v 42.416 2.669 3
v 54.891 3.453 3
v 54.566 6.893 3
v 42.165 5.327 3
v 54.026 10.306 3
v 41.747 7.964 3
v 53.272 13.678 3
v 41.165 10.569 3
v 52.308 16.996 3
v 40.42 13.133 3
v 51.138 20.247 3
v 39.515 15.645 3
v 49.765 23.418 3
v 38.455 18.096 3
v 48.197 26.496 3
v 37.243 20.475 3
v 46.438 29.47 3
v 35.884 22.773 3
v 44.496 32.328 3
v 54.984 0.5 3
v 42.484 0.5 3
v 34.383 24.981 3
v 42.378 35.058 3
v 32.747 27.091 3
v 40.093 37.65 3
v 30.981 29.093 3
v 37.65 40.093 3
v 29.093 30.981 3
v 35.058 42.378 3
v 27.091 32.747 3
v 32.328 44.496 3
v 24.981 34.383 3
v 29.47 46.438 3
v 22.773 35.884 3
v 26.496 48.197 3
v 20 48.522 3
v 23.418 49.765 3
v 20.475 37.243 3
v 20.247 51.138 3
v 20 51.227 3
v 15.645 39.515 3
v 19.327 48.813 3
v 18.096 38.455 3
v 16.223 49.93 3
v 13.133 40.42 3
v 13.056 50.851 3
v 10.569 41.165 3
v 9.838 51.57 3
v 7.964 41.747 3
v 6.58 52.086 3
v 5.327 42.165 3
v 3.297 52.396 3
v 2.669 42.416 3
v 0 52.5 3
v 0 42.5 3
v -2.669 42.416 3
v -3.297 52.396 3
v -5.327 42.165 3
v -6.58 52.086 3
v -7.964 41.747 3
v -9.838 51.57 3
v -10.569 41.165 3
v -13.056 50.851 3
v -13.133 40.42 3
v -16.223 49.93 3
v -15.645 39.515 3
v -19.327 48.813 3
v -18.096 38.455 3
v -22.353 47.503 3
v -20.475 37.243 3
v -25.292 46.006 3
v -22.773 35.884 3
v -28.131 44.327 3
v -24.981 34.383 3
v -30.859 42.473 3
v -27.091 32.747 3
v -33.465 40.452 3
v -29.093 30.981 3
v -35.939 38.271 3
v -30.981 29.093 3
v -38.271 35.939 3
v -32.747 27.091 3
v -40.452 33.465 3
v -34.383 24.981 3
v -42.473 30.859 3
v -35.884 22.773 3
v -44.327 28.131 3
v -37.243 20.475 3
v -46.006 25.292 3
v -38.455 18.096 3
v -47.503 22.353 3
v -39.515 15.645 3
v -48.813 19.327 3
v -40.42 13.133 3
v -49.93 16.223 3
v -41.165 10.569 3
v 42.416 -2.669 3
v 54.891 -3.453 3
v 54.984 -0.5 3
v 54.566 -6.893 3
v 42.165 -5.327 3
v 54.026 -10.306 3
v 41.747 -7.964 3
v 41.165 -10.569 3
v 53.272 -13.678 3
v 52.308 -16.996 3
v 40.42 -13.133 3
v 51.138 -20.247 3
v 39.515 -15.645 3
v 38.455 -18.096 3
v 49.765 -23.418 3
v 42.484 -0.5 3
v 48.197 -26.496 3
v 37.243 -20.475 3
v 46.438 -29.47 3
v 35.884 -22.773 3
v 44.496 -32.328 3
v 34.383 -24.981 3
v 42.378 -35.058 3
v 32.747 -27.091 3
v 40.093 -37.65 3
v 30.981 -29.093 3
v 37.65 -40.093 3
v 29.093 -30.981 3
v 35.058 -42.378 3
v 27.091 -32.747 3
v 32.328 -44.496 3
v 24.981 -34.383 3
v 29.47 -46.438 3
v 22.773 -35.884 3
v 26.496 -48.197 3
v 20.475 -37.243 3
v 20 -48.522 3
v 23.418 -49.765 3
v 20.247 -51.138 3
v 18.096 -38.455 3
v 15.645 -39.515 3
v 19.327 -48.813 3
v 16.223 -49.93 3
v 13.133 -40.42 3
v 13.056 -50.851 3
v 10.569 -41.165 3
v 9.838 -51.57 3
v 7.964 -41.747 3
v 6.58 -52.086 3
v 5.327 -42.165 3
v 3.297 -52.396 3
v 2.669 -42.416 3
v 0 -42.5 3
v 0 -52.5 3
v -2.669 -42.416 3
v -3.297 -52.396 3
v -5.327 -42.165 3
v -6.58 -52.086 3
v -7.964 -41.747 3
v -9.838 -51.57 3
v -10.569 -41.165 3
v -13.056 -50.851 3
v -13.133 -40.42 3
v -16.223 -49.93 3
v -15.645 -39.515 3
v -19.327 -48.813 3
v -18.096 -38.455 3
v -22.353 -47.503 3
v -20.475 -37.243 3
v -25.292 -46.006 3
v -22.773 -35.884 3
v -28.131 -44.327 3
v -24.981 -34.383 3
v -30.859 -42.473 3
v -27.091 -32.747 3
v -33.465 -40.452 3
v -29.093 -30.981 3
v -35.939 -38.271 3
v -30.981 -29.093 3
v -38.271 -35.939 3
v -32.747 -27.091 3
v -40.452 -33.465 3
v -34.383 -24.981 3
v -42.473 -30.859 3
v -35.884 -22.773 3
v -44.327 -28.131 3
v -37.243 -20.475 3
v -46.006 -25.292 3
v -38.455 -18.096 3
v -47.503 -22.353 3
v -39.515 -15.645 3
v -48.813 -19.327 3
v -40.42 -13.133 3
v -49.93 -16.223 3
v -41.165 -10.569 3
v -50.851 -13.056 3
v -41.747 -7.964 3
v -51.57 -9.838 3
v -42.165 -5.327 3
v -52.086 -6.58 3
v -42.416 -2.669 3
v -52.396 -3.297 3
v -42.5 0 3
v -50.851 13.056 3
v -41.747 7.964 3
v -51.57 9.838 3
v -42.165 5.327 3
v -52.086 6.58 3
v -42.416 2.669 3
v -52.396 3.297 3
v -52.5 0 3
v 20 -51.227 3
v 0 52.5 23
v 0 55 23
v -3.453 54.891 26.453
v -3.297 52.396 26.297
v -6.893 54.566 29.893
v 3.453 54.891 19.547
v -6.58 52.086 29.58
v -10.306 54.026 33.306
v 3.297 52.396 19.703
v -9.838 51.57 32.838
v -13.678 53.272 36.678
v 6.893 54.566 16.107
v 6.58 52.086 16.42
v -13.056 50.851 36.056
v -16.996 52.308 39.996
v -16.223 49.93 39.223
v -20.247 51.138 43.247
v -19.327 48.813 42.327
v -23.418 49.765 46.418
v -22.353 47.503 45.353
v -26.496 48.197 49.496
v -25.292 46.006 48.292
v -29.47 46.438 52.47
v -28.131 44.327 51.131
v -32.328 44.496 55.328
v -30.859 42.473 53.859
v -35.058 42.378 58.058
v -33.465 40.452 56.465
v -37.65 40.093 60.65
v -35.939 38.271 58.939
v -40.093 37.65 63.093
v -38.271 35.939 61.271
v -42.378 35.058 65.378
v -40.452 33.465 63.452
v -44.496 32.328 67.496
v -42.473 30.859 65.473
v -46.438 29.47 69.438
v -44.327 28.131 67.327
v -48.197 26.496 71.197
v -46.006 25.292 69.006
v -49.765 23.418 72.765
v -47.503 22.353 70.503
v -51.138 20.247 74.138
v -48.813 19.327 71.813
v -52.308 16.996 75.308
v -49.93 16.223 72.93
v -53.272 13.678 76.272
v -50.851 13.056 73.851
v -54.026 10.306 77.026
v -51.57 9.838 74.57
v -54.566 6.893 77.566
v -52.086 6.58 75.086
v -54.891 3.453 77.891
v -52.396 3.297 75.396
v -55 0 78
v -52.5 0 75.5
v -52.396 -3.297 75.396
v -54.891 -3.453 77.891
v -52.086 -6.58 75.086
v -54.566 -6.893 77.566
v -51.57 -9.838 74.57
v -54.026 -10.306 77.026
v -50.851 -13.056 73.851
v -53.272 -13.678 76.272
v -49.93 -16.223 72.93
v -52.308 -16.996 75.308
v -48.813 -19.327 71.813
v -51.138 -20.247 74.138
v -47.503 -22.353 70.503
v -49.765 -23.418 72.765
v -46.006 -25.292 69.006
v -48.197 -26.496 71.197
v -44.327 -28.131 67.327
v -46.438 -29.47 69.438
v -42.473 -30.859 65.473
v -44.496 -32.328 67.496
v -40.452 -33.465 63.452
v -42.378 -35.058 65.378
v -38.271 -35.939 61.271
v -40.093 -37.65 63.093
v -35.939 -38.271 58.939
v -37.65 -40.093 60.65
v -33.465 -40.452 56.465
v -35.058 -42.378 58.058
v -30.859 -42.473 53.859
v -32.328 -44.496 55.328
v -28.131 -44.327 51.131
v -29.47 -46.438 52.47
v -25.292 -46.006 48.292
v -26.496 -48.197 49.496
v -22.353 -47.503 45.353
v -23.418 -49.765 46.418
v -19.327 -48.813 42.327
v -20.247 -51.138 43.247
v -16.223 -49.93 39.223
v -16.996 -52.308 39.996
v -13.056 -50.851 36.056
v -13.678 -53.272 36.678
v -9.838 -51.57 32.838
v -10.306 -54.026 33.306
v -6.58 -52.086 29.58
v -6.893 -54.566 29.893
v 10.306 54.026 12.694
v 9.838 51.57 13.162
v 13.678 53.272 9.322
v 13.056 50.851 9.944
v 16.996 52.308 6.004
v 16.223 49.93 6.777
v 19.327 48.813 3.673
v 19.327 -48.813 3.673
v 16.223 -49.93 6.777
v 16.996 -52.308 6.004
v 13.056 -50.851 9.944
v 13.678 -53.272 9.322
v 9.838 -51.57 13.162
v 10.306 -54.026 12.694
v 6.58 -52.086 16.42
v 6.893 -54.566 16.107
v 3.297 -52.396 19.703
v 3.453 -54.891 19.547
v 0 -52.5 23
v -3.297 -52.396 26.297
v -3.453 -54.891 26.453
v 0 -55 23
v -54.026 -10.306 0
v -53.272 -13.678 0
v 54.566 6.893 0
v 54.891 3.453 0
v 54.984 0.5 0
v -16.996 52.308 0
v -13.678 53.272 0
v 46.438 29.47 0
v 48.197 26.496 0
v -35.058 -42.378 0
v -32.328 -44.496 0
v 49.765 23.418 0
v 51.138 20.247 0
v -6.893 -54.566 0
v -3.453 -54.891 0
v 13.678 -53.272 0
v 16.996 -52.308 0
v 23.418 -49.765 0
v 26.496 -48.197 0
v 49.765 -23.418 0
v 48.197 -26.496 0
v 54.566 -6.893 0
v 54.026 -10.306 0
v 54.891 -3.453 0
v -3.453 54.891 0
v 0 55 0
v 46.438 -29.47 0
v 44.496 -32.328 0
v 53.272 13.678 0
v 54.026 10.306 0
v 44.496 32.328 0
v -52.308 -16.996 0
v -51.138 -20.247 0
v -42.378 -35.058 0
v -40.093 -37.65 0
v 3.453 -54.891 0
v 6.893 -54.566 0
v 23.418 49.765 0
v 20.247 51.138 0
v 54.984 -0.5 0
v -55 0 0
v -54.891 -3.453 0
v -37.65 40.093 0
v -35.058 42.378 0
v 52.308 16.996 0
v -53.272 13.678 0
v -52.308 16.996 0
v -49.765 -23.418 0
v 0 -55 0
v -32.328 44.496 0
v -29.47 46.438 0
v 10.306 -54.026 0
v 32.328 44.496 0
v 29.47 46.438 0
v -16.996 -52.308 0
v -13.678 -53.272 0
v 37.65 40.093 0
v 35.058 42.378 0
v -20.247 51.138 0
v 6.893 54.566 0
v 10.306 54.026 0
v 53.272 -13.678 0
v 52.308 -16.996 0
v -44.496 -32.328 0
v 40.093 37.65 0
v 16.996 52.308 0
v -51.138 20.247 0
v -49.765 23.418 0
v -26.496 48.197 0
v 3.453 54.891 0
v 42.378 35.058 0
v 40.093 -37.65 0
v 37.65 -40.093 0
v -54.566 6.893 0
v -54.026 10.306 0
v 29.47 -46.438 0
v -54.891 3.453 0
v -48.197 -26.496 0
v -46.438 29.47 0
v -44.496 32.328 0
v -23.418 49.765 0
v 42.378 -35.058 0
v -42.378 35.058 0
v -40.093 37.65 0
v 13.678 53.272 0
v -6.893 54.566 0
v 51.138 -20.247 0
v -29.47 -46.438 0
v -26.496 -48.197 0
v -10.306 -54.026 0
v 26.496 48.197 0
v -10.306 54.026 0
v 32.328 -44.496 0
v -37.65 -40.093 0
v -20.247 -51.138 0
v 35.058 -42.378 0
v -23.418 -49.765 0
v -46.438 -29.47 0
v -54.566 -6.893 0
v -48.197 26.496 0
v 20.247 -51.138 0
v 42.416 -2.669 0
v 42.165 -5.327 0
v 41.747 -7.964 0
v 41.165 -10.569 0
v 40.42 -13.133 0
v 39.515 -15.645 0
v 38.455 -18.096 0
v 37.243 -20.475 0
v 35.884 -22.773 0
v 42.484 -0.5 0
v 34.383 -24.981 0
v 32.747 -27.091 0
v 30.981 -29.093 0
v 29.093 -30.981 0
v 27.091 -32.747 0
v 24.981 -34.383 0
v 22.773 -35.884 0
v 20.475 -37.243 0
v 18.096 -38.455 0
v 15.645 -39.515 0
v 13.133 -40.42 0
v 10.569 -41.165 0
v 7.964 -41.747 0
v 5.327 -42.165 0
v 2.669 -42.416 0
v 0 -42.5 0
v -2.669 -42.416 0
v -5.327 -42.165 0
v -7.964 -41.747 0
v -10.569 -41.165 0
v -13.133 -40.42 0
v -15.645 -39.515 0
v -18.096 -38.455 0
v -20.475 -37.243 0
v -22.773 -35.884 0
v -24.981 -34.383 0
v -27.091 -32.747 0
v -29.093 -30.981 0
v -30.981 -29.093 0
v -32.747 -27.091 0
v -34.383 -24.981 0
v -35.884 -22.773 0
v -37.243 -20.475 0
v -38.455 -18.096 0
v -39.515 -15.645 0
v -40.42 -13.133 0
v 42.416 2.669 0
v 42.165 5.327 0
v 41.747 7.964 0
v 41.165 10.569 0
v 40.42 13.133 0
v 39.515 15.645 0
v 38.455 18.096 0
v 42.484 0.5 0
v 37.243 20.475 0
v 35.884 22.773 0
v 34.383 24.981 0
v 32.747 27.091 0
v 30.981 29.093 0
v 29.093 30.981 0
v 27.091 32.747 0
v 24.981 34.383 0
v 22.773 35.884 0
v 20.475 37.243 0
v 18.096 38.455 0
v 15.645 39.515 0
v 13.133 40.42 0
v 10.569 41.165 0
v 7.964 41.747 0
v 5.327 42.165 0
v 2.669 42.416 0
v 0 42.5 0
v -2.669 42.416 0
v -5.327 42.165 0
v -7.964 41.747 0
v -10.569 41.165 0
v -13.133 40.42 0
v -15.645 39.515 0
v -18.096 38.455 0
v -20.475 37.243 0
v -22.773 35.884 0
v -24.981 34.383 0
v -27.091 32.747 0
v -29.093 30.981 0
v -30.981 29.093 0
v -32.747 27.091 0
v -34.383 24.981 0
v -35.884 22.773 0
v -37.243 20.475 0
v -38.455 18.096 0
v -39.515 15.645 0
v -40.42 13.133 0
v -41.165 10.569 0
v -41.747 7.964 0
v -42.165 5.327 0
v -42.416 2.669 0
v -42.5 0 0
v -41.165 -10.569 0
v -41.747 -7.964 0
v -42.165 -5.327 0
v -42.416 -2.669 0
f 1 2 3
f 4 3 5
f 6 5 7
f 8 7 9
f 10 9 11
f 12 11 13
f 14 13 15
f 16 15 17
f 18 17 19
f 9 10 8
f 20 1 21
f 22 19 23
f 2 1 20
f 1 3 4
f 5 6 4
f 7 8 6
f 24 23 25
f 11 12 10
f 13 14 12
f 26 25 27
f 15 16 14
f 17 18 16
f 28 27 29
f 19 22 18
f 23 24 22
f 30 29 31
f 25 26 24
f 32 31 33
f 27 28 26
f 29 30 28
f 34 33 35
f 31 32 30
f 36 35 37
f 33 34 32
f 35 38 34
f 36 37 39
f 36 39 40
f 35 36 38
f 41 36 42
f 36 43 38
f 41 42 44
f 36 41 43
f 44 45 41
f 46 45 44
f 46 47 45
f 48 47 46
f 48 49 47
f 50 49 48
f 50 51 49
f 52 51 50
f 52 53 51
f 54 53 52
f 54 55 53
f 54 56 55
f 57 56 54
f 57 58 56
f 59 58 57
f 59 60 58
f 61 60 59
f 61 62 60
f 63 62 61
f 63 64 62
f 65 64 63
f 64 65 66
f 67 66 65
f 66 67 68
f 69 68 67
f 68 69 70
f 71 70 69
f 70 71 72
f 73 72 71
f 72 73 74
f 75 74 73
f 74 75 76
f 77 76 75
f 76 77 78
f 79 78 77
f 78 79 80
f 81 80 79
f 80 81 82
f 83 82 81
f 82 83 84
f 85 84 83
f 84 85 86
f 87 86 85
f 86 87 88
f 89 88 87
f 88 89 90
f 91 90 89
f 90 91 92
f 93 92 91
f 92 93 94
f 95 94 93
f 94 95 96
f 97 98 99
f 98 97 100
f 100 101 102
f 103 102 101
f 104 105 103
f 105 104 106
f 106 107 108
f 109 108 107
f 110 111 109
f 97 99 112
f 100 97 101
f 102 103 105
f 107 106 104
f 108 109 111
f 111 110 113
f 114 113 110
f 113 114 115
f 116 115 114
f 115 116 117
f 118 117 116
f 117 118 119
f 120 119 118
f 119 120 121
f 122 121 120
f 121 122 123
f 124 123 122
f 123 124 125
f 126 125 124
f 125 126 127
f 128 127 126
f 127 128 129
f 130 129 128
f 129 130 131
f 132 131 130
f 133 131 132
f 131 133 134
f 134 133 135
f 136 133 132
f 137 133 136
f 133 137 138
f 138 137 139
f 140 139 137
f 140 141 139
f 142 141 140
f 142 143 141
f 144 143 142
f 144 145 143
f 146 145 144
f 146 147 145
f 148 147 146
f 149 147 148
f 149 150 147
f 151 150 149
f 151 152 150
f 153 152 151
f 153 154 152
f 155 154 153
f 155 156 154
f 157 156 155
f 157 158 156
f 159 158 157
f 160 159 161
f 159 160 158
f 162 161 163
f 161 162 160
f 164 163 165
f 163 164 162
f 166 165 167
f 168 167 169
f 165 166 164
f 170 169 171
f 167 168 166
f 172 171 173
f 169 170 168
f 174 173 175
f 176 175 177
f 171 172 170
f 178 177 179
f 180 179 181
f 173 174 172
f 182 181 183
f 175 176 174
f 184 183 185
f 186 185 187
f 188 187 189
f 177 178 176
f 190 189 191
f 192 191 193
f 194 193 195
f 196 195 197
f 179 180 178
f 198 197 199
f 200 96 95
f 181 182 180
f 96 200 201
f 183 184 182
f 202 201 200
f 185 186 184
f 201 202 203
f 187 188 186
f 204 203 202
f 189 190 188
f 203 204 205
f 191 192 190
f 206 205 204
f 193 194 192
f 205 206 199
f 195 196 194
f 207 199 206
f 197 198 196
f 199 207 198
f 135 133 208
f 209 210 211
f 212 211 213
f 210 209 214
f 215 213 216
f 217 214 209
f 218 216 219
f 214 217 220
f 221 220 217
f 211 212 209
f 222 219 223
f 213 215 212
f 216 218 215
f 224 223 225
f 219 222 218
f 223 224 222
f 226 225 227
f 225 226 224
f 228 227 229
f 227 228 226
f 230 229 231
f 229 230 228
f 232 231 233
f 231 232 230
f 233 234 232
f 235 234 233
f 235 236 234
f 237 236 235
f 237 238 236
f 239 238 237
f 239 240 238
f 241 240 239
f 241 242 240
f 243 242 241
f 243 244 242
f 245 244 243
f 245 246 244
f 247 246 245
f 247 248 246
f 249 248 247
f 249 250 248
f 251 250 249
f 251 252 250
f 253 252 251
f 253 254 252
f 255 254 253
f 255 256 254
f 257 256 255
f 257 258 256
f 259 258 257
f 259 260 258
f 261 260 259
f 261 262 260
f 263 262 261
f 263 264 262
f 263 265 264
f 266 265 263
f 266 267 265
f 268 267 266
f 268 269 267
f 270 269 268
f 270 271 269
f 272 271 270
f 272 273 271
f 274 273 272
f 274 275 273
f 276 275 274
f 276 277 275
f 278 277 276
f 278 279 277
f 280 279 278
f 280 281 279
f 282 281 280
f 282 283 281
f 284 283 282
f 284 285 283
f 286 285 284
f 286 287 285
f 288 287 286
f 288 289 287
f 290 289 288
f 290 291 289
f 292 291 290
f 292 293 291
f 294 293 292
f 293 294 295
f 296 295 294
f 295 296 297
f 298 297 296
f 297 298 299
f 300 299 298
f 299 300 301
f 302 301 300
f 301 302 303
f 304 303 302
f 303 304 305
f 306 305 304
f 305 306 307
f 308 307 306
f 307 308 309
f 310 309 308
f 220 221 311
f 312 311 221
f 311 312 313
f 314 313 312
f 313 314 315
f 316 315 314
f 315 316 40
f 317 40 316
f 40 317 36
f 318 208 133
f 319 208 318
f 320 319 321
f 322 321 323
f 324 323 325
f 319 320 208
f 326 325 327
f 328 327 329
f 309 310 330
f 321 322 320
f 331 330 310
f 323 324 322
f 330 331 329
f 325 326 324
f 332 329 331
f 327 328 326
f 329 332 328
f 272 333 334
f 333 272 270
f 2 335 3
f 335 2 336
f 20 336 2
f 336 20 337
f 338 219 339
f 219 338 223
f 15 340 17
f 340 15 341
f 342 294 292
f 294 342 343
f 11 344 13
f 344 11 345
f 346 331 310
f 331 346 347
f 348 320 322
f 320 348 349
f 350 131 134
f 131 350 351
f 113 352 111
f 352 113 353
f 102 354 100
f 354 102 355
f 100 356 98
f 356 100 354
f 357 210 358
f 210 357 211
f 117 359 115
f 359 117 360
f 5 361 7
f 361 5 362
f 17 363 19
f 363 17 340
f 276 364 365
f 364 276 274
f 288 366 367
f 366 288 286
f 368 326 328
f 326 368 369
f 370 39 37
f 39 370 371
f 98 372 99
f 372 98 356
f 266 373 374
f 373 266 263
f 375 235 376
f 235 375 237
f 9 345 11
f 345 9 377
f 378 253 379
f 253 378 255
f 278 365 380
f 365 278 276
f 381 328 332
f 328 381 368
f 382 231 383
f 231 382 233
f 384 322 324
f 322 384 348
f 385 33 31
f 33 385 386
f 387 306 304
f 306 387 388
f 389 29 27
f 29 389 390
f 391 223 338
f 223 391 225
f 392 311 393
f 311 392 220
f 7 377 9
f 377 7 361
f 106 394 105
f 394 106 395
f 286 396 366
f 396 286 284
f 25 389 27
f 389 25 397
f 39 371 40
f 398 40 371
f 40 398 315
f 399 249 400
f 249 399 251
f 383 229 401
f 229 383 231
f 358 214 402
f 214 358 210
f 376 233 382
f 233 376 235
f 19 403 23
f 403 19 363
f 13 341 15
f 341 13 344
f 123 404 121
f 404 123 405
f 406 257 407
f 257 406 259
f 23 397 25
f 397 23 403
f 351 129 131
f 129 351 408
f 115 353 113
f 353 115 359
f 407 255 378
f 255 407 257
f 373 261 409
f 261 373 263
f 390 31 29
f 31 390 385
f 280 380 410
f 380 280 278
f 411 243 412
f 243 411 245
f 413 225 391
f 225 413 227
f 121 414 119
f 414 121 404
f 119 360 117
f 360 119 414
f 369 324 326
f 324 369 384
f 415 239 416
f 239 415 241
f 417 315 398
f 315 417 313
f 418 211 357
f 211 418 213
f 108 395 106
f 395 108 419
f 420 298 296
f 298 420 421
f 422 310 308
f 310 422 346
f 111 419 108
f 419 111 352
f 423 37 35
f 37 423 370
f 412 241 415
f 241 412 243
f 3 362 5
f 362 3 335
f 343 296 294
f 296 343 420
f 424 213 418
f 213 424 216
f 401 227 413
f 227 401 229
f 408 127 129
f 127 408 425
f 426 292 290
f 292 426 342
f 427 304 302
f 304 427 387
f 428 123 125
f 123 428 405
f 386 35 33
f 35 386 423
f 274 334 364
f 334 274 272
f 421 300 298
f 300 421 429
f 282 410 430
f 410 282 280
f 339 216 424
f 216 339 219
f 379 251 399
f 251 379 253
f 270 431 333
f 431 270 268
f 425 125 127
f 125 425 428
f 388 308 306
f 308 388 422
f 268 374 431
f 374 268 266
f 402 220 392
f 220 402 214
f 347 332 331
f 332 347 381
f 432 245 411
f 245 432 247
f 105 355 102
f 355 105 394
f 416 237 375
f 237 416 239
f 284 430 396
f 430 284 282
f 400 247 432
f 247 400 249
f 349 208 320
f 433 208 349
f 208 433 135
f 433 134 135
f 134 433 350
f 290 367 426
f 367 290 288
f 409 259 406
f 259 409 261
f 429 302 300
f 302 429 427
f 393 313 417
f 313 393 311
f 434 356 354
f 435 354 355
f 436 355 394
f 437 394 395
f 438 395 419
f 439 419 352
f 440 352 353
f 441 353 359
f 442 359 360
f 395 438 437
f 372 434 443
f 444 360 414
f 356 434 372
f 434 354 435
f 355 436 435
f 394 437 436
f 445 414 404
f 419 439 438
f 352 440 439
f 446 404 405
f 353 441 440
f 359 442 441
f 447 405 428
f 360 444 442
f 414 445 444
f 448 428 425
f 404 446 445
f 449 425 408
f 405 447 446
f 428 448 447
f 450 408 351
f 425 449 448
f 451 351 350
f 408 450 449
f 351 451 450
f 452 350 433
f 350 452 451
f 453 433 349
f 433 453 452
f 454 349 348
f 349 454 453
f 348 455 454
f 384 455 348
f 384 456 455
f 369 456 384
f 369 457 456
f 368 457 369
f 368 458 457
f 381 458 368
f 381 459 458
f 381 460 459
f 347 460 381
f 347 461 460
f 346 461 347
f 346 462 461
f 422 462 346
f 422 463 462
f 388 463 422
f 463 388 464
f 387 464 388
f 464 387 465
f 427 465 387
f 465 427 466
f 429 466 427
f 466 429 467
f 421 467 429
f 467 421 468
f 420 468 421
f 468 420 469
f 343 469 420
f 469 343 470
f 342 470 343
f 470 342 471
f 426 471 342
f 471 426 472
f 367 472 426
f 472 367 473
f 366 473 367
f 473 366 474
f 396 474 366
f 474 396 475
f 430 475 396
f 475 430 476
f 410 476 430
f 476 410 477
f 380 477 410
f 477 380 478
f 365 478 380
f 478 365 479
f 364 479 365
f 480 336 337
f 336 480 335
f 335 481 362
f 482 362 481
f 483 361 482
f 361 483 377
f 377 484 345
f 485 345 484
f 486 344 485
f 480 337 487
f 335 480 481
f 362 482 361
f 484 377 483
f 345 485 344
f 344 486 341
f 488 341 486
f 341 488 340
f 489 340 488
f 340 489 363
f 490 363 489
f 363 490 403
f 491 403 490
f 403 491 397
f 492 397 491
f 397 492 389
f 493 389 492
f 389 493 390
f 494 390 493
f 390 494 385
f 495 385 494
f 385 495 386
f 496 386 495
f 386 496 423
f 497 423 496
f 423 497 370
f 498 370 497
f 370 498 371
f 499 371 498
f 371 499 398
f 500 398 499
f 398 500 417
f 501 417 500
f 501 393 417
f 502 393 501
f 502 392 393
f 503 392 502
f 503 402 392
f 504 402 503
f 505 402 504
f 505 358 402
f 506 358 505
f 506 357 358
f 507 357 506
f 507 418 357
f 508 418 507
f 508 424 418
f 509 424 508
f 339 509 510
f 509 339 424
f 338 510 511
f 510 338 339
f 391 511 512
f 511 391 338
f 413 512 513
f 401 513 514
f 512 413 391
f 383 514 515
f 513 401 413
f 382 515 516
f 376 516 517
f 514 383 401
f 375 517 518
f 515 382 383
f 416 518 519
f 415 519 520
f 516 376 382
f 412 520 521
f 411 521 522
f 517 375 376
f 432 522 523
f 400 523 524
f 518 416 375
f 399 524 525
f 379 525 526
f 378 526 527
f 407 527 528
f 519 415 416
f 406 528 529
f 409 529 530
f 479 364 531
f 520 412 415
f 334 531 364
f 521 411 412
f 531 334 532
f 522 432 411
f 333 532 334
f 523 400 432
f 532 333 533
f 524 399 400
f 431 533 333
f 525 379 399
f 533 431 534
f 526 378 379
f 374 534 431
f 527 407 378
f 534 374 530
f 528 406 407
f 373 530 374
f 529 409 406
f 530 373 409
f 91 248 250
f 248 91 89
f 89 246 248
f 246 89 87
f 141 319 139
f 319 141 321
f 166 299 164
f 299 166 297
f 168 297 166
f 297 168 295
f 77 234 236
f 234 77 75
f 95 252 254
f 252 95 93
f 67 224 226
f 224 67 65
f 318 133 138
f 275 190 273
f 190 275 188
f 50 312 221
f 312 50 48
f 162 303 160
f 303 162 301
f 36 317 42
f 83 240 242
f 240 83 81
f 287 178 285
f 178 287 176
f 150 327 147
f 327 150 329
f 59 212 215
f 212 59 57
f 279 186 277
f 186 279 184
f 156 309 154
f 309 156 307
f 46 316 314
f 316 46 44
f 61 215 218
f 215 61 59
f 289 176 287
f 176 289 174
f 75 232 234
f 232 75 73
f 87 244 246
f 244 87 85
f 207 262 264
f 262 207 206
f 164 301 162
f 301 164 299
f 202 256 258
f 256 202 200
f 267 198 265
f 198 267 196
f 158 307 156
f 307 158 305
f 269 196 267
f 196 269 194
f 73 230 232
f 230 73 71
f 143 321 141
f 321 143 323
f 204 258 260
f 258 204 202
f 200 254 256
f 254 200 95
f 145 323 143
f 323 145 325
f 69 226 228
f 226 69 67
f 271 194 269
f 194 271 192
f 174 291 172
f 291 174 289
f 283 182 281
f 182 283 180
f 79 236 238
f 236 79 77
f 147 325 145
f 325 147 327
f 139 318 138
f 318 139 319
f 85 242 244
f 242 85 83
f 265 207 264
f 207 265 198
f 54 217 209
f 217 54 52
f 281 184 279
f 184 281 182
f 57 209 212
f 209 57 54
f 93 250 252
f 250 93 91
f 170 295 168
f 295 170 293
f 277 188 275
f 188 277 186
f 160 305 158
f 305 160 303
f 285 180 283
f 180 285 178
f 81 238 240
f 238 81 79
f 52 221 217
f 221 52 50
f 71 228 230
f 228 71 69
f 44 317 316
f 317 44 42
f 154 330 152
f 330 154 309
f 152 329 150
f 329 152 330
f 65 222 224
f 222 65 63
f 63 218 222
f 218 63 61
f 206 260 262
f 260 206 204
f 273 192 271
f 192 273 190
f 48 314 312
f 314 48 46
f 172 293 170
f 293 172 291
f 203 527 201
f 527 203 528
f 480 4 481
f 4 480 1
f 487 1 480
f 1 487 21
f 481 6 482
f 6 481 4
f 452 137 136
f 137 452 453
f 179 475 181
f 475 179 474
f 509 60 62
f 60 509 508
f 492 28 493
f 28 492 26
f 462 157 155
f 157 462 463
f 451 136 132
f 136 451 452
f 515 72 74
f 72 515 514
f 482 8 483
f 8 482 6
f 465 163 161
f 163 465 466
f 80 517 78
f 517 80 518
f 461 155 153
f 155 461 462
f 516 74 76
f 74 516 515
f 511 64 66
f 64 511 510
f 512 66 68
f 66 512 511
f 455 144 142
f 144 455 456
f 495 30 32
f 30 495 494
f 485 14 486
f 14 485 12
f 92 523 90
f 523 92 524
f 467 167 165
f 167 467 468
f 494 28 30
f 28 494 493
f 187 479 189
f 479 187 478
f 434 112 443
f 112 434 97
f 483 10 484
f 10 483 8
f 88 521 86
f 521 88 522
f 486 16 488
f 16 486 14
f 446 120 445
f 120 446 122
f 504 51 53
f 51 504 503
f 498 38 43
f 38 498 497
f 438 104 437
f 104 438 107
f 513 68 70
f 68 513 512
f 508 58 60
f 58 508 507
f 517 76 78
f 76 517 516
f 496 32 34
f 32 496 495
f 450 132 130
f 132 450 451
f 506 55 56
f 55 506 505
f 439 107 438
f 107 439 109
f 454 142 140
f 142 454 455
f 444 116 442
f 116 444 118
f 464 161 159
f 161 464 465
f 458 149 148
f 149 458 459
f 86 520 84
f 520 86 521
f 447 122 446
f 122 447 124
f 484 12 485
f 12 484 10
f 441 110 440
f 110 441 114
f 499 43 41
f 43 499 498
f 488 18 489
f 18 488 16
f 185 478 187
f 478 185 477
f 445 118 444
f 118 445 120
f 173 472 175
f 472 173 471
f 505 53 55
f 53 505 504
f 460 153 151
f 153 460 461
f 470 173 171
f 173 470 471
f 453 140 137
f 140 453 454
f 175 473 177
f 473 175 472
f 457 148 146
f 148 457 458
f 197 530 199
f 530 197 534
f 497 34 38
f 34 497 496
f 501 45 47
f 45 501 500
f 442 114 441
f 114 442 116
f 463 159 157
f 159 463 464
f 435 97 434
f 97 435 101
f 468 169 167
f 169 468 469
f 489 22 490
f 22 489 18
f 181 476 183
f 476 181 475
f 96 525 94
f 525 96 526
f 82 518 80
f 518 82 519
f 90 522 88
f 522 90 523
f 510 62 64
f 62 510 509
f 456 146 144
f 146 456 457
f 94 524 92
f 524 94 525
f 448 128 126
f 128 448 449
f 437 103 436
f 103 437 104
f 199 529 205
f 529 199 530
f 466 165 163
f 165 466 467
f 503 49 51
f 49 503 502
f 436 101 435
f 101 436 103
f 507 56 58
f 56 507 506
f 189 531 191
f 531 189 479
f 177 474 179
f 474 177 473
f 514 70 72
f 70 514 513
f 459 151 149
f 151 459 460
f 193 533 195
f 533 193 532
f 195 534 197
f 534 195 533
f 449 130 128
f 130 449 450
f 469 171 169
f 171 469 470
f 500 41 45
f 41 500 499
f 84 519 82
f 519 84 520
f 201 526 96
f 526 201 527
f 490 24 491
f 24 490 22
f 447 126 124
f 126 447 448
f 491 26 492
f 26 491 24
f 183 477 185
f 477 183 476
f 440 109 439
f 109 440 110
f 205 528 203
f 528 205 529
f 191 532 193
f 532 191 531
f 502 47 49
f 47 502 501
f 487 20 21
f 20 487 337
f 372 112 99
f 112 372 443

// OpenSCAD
$fn=100;

difference() {
    cylinder(d=110,h=80);
    translate([0,0,3]) cylinder(d=105,h=80);
    translate([0,0,-1]) cylinder(d=85,h=100);
    translate([20,-60,3]) {
        cube([120,120,120]);
        rotate([0,-45,0]) cube([120,120,120]);
    };
    translate([50,0,0]) cube([100,1,10],center=true);
}
